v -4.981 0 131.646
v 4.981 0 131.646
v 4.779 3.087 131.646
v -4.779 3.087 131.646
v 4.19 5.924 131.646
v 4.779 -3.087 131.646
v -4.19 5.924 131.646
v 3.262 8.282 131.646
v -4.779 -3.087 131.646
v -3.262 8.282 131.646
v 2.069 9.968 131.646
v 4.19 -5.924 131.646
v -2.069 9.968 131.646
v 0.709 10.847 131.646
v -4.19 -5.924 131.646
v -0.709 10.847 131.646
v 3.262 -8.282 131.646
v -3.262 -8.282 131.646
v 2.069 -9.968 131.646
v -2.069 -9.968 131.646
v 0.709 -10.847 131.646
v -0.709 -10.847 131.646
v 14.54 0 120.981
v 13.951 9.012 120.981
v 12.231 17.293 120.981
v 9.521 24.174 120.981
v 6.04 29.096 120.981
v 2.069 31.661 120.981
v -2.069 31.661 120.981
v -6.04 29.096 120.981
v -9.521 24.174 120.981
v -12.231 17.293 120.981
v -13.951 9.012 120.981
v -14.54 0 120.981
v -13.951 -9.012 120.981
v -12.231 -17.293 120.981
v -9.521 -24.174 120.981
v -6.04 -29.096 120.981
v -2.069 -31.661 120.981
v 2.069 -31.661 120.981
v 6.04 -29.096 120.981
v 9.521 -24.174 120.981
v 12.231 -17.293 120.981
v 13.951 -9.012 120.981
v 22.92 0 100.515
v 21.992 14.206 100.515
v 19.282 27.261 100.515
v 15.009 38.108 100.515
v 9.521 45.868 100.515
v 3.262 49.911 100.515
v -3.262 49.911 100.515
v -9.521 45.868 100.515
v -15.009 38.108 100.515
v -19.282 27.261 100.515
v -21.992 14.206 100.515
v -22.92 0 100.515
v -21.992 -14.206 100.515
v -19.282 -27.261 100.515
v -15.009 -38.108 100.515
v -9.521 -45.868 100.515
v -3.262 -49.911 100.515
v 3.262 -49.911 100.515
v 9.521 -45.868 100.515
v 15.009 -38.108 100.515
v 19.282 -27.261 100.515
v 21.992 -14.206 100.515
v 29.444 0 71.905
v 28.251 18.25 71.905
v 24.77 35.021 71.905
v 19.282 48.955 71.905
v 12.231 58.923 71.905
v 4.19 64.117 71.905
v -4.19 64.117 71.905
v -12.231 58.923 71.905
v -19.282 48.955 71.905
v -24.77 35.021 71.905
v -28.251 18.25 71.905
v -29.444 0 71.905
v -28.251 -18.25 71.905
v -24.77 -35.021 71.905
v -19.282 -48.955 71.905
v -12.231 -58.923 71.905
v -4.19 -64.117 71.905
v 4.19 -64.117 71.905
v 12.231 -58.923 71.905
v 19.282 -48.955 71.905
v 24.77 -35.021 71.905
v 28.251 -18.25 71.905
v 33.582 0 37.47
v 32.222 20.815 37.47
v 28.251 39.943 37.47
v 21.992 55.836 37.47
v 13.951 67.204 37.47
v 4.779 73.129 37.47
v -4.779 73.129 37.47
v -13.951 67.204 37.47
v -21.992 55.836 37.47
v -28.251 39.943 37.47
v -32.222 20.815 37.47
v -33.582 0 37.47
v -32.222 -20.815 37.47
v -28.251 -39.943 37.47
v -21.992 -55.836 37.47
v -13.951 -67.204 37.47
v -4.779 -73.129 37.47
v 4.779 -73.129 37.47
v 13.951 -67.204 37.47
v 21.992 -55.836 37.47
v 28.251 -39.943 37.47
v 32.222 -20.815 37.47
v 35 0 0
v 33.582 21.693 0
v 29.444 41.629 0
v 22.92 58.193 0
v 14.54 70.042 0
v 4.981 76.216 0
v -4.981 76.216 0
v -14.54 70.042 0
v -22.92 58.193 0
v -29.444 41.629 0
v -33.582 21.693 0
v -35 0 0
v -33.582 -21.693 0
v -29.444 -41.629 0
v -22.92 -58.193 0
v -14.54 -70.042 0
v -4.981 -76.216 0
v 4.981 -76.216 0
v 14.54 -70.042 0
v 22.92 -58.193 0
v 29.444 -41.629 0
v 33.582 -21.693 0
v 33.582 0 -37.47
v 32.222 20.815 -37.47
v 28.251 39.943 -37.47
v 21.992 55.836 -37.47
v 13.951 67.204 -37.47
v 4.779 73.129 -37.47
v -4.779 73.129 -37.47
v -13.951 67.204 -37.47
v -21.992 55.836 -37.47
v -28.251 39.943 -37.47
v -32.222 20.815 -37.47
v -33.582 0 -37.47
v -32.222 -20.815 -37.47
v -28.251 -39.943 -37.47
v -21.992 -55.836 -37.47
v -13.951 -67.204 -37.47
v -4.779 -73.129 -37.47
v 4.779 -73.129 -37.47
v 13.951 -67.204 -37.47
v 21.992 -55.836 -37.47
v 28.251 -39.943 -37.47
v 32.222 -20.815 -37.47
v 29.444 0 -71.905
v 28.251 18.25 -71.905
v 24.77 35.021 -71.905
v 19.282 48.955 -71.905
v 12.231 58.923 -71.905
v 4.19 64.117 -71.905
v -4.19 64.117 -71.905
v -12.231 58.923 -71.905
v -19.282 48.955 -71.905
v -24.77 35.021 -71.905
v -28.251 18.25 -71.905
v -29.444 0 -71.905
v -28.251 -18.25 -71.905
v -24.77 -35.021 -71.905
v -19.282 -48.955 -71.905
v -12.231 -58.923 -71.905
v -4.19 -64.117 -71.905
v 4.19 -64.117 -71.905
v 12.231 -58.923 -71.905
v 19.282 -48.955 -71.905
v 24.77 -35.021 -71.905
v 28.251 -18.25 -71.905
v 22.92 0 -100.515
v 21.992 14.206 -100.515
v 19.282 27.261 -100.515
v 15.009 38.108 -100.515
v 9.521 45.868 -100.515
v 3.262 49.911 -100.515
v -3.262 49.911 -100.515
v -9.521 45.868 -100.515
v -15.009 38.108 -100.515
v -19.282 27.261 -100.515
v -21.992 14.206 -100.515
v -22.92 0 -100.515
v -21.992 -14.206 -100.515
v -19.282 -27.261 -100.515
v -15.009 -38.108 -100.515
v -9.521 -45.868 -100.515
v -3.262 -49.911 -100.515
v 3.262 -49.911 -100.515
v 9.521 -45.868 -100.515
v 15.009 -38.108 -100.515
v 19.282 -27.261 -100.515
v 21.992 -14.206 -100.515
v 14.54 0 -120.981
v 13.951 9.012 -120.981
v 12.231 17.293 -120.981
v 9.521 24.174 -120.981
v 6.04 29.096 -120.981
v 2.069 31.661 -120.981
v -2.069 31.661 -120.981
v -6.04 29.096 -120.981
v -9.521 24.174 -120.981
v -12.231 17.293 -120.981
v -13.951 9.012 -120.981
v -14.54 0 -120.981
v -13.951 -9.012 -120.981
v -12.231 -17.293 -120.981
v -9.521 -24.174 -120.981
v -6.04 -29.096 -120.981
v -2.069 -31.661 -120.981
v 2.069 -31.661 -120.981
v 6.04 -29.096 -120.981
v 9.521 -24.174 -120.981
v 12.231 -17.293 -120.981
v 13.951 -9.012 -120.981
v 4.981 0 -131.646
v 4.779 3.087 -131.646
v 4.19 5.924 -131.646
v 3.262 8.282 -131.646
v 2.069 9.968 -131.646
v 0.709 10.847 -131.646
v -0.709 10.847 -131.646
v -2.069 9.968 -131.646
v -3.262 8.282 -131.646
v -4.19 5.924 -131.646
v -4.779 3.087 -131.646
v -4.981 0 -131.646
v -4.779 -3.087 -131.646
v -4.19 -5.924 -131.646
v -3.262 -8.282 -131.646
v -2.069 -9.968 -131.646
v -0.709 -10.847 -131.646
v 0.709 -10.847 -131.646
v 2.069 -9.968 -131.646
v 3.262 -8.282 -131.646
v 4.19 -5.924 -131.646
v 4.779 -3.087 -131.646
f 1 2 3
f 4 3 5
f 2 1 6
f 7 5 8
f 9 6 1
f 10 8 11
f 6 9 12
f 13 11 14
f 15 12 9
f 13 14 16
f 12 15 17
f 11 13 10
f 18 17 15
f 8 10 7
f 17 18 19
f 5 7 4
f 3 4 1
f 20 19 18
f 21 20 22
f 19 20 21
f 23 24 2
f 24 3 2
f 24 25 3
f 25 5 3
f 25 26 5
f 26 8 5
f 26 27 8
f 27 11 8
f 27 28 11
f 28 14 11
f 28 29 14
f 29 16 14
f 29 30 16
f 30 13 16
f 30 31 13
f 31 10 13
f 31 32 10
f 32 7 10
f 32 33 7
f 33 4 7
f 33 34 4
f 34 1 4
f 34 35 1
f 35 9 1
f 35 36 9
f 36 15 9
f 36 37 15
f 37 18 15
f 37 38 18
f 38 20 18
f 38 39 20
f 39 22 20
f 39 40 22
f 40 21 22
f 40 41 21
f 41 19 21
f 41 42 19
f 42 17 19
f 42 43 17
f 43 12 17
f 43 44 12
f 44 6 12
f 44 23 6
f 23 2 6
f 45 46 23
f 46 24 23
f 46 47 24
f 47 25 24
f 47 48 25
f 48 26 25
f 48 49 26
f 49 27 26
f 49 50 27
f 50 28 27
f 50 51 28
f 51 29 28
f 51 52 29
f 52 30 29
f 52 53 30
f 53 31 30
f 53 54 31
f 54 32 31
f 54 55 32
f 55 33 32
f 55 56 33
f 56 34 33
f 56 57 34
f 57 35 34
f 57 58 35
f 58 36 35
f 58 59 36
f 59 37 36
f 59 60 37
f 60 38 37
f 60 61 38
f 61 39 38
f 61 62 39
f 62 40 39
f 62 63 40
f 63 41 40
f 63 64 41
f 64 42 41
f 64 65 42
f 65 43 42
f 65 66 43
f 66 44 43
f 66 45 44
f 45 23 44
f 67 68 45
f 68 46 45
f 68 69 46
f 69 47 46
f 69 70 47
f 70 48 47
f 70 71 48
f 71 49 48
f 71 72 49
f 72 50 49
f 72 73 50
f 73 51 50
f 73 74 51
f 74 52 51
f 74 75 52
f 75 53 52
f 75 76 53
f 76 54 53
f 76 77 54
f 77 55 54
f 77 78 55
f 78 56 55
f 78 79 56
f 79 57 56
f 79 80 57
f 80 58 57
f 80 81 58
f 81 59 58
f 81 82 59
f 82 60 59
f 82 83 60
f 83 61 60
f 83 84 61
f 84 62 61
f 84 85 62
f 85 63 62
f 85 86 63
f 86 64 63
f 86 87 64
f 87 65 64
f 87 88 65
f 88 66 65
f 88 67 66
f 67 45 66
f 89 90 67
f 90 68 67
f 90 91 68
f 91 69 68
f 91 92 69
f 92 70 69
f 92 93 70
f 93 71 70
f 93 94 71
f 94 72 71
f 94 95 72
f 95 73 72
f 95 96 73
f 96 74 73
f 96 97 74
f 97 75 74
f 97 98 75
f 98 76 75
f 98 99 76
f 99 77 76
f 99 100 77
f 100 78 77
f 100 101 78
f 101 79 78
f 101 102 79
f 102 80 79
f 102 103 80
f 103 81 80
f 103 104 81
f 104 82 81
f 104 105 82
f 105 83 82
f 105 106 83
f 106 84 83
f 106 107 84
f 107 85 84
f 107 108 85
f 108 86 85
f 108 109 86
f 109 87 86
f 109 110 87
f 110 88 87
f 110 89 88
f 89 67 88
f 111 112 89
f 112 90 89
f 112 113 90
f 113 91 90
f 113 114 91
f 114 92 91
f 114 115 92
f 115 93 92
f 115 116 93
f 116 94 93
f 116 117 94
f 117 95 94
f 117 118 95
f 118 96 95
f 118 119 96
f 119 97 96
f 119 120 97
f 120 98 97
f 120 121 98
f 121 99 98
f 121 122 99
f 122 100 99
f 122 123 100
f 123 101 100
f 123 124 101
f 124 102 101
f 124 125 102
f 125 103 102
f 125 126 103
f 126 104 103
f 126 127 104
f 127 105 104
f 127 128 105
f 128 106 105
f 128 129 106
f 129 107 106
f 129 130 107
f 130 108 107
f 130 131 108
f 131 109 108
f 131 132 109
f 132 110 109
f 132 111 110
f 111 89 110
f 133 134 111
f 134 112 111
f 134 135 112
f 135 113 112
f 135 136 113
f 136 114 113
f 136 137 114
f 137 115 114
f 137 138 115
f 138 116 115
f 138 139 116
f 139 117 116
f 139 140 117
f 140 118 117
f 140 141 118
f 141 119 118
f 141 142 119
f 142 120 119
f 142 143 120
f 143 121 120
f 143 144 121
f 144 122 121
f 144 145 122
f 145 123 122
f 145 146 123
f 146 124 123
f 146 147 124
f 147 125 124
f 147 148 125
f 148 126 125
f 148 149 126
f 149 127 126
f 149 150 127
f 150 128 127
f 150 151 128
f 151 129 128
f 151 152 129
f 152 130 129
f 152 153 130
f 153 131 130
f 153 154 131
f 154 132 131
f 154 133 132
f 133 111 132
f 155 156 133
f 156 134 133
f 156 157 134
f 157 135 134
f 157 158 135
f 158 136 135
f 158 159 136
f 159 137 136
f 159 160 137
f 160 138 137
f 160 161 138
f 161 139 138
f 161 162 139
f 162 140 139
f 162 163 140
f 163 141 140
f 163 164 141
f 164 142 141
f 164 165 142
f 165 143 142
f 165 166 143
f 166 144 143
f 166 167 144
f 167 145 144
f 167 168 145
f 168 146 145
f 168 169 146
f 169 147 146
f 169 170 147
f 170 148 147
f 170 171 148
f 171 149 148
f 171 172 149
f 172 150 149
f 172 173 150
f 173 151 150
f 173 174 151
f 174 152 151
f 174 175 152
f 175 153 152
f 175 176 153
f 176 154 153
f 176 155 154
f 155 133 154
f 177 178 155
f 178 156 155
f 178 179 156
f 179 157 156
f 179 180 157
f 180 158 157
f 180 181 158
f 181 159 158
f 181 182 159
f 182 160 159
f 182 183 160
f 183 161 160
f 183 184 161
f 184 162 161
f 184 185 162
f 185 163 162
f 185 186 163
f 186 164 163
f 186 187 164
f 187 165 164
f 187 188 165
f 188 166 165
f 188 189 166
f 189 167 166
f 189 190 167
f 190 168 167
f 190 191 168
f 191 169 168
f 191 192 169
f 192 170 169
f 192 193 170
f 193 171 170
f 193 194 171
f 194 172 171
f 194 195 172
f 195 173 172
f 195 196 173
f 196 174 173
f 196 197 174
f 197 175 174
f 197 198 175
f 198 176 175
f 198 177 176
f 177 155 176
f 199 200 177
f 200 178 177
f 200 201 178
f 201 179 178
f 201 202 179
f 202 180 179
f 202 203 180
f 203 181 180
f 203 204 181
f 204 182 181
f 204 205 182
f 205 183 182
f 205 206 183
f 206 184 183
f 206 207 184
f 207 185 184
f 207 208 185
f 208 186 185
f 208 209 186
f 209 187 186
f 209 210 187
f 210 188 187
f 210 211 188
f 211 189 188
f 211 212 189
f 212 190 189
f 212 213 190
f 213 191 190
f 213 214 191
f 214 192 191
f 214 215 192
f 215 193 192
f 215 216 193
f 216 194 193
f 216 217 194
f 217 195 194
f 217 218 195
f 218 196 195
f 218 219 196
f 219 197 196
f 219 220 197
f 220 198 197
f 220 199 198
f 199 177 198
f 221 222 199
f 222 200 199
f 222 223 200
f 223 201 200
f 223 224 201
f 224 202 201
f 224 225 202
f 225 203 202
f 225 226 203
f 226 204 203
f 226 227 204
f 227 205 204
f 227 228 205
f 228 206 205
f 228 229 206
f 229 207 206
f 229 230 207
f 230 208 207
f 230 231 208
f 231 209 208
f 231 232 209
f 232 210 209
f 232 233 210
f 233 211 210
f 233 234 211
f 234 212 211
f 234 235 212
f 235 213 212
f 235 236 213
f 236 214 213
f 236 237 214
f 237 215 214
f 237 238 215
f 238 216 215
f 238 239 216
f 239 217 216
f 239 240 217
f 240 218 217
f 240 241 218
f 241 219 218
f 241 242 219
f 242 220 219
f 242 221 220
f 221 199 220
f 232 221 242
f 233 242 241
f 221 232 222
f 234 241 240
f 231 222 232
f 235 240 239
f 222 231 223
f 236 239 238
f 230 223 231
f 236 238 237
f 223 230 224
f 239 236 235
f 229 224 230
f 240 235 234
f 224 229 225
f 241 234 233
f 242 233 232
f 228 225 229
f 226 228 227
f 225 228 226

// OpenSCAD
// Generated by SolidPython 1.0.1 on 2020-07-29 00:46:46


scale(v = [5, 11, 19]) {
	sphere(r = 7);
}
/***********************************************
*********      SolidPython code:      **********
************************************************
 
# import packages: SolidPython
from solid import *
from solid.utils import *
from itertools import chain, combinations, permutations


class Resize:

    def __init__(self, scad_file):
        self.scad_file = scad_file
        #self.scad_file = import_scad(scad_file)
        # cone/cylinder param:
        self.r1 = 0
        self.r2 = 0
        self.h = 0
        # rectangular prism param:
        self.w = 0
        self.l = 0
        # ellipse param:
        self.r = 0

    # import OpenScad code (file name corresponds to shape)


    # classify shape + parameters
    def assign(self, param1, param2, param3):
        if self.scad_file == 'cone.scad':
            self.r1 = param1
            self.r2 = param2
            self.h = param3
        elif self.scad_file == 'cylinder.scad':
            self.r1 = param1
            self.r2 = param2
            self.h = param3
        elif self.scad_file == 'rectangularPrism.scad':
            self.h = param1
            self.l = param2
            self.w = param3
        else:
            self.r = param1
            self.h = param2

    # resize parameters
    def iterate(self):
        x = range(3, 20, 2)
        i = 1
        if self.scad_file == 'cone.scad':
            tempList = list(permutations(x, 2))
            for temp in tempList:
                param1 = temp[0]
                param2 = temp[1]
                filepath = 'produced_scad_files/' + 'cone' + str(param1) + '_' + str(param2) + '_' + '.scad'
                scad_render_to_file(cylinder(h=param1, r1=param2, r2=0), filepath)

        elif self.scad_file == 'cylinder.scad':
            tempList = list(permutations(x, 3))
            for temp in tempList:
                param1 = temp[0]
                param2 = temp[1]
                filepath = 'produced_scad_files/' + 'cylinder' + str(param1) + '_' + str(param2) + '_' + '.scad'
                scad_render_to_file(cylinder(h=param1, r1=param2, r2=param2), filepath)

        elif self.scad_file == 'rectangularPrism.scad':
            tempList = list(permutations(x, 3))
            for temp in tempList:
                param1 = temp[0]
                param2 = temp[1]
                param3 = temp[2]
                filepath = 'produced_scad_files/' + 'rectangularPrism' + str(param1) + '_' + str(param2) + '_' + str(
                    param3) + '.scad'
                scad_render_to_file(cube(size=(param1, param2, param3)), filepath)

        elif self.scad_file == 'ellipse.scad':
            tempList = list(permutations(x, 4))
            for temp in tempList:
                param1 = temp[0]
                param2 = temp[1]
                param3 = temp[2]
                param4 = temp[3]
                filepath = 'produced_scad_files/' + 'ellipse' + str(param1) + '_' + str(param2) + '_' + str(param3) + '_' + str(param4) + '.scad'
                scad_render_to_file(scale([param1, param2, param3])(sphere(r=param4)), filepath)

    def render_to_scadfile(self):
        scad_render_to_file(scad, 'example.scad') 
 
************************************************/
